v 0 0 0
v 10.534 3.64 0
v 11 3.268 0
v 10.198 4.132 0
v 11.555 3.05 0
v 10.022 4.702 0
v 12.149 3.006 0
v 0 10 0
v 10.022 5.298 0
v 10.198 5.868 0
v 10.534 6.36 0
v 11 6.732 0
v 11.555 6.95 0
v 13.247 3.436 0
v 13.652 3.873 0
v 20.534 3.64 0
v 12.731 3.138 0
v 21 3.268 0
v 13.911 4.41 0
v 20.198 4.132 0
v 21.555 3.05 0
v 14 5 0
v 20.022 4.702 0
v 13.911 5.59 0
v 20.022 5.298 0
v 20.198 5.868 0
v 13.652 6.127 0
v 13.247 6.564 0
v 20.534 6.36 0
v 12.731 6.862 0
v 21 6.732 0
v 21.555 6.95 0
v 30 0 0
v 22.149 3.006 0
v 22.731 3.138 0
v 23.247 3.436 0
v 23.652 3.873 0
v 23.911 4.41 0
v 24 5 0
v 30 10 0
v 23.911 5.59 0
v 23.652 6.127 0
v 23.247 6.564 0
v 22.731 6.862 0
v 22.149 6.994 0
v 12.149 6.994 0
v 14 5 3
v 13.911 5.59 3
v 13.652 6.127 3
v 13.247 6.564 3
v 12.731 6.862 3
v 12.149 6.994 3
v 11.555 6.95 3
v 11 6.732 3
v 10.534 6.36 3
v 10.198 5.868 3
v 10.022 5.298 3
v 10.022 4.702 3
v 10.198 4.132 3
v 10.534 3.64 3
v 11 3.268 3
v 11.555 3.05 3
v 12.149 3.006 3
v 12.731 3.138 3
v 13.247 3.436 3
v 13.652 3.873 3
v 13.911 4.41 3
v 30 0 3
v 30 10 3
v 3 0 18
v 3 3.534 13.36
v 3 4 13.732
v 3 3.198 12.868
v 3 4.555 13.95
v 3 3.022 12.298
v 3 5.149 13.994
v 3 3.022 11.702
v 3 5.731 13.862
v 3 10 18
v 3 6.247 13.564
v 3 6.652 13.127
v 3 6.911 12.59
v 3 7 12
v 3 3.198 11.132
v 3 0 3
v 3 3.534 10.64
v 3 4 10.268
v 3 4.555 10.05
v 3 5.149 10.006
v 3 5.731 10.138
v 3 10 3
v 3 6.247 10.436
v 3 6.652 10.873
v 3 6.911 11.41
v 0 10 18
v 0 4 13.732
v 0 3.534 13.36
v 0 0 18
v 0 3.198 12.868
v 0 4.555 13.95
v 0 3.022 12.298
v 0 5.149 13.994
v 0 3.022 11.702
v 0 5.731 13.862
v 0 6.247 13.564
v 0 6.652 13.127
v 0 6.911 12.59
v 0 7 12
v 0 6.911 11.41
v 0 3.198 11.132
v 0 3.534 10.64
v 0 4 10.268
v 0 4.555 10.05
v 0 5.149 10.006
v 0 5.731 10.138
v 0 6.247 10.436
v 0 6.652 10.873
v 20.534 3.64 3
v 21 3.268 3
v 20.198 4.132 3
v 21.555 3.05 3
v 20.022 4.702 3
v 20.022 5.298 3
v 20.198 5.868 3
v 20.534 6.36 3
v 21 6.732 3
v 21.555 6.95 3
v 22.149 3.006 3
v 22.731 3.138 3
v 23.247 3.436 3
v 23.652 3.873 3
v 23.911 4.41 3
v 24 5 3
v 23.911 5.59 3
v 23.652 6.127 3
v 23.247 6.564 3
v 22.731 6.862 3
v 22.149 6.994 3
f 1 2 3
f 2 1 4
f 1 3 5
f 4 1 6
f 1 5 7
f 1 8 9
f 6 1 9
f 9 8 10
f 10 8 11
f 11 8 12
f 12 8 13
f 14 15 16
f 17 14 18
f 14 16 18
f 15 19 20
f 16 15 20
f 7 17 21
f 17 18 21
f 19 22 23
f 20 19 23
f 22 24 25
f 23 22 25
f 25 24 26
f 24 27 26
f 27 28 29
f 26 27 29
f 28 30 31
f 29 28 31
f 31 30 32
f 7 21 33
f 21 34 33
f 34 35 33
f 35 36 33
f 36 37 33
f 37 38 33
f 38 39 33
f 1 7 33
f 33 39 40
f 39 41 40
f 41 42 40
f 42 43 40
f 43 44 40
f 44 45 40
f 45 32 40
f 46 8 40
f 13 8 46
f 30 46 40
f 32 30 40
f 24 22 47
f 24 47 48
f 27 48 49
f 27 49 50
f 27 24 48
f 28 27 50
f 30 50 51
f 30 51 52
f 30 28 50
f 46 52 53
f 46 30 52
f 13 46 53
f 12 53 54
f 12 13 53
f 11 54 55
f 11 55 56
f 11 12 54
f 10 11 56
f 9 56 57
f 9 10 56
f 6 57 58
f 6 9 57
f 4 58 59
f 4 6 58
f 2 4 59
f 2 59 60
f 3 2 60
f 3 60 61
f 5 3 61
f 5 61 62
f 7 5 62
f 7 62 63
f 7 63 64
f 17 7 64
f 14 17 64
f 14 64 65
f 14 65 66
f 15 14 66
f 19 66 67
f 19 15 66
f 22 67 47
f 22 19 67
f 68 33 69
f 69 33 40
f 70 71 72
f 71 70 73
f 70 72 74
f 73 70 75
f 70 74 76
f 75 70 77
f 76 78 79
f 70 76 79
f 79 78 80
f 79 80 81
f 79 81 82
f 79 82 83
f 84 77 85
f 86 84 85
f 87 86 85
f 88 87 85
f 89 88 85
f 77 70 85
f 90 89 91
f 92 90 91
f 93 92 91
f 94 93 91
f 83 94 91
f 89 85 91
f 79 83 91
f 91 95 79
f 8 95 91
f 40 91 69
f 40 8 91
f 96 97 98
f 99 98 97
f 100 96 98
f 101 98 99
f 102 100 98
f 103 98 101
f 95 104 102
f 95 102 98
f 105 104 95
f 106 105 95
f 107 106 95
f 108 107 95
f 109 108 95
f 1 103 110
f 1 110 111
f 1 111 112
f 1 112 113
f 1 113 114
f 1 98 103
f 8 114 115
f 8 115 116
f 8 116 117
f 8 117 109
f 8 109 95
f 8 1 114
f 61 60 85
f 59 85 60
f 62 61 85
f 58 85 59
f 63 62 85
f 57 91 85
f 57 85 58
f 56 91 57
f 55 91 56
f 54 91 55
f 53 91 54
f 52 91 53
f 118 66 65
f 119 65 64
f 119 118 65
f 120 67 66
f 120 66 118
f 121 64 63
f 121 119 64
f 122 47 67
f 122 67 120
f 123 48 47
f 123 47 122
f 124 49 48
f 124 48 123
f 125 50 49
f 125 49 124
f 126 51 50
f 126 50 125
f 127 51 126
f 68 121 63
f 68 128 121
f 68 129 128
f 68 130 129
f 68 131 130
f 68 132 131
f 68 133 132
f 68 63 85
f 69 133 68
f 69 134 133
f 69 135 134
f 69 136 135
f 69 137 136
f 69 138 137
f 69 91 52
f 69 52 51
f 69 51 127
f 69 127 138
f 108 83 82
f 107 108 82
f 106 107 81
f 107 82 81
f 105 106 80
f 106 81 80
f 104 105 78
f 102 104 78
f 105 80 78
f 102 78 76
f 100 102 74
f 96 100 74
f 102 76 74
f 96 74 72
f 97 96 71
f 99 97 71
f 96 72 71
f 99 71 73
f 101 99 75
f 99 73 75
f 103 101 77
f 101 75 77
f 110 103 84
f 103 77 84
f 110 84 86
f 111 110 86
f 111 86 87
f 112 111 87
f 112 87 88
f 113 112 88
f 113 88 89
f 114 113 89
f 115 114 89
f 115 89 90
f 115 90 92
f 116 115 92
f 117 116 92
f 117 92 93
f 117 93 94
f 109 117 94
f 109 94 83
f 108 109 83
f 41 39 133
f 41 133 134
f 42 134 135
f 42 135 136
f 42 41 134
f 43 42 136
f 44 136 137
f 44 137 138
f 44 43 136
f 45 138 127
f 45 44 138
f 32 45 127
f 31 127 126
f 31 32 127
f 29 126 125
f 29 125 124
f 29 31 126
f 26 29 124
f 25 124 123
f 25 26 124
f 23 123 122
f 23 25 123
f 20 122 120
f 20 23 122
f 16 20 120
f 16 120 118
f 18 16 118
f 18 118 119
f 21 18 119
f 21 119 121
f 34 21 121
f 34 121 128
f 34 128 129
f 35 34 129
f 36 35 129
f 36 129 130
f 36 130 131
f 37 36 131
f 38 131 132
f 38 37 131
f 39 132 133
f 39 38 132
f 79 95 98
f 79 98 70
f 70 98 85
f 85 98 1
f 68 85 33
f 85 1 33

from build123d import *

# Parameters (mm, degrees)
SKETCH2_W           = 30
SKETCH2_H           = 10
SKETCH2_R           = 2
BOSS_EXTRUDE1_DEPTH = 3
SKETCH3_W           = 3
SKETCH3_H           = 10
BOSS_EXTRUDE2_DEPTH = 15
SKETCH4_R           = 2
CUT_EXTRUDE1_DEPTH  = 27


with BuildPart() as part:
    # Sketch2 → Boss-Extrude1 (new body)
    with BuildSketch(Plane.XY):
        with Locations((15, 5)):
            Rectangle(SKETCH2_W, SKETCH2_H)
        with Locations((12, 5)):
            Circle(SKETCH2_R, mode=Mode.SUBTRACT)
        with Locations((22, 5)):
            Circle(SKETCH2_R, mode=Mode.SUBTRACT)
    extrude(amount=BOSS_EXTRUDE1_DEPTH)

    # Sketch3 → Boss-Extrude2 (add)
    with BuildSketch(Plane.XY.offset(3)):
        with Locations((1.5, 5)):
            Rectangle(SKETCH3_W, SKETCH3_H)
    extrude(amount=BOSS_EXTRUDE2_DEPTH)

    # Sketch4 → Cut-Extrude1 (cut)
    with BuildSketch(Plane(origin=(3, 0, 0), x_dir=(0, 0, -1), z_dir=(1, 0, 0))):
        with Locations((-22, 5)):
            Circle(SKETCH4_R)
        with Locations(Location((-12, 5, 0), (0, 0, 90))):
            Circle(SKETCH4_R)
    extrude(amount=-CUT_EXTRUDE1_DEPTH, mode=Mode.SUBTRACT)


solid = part.part
